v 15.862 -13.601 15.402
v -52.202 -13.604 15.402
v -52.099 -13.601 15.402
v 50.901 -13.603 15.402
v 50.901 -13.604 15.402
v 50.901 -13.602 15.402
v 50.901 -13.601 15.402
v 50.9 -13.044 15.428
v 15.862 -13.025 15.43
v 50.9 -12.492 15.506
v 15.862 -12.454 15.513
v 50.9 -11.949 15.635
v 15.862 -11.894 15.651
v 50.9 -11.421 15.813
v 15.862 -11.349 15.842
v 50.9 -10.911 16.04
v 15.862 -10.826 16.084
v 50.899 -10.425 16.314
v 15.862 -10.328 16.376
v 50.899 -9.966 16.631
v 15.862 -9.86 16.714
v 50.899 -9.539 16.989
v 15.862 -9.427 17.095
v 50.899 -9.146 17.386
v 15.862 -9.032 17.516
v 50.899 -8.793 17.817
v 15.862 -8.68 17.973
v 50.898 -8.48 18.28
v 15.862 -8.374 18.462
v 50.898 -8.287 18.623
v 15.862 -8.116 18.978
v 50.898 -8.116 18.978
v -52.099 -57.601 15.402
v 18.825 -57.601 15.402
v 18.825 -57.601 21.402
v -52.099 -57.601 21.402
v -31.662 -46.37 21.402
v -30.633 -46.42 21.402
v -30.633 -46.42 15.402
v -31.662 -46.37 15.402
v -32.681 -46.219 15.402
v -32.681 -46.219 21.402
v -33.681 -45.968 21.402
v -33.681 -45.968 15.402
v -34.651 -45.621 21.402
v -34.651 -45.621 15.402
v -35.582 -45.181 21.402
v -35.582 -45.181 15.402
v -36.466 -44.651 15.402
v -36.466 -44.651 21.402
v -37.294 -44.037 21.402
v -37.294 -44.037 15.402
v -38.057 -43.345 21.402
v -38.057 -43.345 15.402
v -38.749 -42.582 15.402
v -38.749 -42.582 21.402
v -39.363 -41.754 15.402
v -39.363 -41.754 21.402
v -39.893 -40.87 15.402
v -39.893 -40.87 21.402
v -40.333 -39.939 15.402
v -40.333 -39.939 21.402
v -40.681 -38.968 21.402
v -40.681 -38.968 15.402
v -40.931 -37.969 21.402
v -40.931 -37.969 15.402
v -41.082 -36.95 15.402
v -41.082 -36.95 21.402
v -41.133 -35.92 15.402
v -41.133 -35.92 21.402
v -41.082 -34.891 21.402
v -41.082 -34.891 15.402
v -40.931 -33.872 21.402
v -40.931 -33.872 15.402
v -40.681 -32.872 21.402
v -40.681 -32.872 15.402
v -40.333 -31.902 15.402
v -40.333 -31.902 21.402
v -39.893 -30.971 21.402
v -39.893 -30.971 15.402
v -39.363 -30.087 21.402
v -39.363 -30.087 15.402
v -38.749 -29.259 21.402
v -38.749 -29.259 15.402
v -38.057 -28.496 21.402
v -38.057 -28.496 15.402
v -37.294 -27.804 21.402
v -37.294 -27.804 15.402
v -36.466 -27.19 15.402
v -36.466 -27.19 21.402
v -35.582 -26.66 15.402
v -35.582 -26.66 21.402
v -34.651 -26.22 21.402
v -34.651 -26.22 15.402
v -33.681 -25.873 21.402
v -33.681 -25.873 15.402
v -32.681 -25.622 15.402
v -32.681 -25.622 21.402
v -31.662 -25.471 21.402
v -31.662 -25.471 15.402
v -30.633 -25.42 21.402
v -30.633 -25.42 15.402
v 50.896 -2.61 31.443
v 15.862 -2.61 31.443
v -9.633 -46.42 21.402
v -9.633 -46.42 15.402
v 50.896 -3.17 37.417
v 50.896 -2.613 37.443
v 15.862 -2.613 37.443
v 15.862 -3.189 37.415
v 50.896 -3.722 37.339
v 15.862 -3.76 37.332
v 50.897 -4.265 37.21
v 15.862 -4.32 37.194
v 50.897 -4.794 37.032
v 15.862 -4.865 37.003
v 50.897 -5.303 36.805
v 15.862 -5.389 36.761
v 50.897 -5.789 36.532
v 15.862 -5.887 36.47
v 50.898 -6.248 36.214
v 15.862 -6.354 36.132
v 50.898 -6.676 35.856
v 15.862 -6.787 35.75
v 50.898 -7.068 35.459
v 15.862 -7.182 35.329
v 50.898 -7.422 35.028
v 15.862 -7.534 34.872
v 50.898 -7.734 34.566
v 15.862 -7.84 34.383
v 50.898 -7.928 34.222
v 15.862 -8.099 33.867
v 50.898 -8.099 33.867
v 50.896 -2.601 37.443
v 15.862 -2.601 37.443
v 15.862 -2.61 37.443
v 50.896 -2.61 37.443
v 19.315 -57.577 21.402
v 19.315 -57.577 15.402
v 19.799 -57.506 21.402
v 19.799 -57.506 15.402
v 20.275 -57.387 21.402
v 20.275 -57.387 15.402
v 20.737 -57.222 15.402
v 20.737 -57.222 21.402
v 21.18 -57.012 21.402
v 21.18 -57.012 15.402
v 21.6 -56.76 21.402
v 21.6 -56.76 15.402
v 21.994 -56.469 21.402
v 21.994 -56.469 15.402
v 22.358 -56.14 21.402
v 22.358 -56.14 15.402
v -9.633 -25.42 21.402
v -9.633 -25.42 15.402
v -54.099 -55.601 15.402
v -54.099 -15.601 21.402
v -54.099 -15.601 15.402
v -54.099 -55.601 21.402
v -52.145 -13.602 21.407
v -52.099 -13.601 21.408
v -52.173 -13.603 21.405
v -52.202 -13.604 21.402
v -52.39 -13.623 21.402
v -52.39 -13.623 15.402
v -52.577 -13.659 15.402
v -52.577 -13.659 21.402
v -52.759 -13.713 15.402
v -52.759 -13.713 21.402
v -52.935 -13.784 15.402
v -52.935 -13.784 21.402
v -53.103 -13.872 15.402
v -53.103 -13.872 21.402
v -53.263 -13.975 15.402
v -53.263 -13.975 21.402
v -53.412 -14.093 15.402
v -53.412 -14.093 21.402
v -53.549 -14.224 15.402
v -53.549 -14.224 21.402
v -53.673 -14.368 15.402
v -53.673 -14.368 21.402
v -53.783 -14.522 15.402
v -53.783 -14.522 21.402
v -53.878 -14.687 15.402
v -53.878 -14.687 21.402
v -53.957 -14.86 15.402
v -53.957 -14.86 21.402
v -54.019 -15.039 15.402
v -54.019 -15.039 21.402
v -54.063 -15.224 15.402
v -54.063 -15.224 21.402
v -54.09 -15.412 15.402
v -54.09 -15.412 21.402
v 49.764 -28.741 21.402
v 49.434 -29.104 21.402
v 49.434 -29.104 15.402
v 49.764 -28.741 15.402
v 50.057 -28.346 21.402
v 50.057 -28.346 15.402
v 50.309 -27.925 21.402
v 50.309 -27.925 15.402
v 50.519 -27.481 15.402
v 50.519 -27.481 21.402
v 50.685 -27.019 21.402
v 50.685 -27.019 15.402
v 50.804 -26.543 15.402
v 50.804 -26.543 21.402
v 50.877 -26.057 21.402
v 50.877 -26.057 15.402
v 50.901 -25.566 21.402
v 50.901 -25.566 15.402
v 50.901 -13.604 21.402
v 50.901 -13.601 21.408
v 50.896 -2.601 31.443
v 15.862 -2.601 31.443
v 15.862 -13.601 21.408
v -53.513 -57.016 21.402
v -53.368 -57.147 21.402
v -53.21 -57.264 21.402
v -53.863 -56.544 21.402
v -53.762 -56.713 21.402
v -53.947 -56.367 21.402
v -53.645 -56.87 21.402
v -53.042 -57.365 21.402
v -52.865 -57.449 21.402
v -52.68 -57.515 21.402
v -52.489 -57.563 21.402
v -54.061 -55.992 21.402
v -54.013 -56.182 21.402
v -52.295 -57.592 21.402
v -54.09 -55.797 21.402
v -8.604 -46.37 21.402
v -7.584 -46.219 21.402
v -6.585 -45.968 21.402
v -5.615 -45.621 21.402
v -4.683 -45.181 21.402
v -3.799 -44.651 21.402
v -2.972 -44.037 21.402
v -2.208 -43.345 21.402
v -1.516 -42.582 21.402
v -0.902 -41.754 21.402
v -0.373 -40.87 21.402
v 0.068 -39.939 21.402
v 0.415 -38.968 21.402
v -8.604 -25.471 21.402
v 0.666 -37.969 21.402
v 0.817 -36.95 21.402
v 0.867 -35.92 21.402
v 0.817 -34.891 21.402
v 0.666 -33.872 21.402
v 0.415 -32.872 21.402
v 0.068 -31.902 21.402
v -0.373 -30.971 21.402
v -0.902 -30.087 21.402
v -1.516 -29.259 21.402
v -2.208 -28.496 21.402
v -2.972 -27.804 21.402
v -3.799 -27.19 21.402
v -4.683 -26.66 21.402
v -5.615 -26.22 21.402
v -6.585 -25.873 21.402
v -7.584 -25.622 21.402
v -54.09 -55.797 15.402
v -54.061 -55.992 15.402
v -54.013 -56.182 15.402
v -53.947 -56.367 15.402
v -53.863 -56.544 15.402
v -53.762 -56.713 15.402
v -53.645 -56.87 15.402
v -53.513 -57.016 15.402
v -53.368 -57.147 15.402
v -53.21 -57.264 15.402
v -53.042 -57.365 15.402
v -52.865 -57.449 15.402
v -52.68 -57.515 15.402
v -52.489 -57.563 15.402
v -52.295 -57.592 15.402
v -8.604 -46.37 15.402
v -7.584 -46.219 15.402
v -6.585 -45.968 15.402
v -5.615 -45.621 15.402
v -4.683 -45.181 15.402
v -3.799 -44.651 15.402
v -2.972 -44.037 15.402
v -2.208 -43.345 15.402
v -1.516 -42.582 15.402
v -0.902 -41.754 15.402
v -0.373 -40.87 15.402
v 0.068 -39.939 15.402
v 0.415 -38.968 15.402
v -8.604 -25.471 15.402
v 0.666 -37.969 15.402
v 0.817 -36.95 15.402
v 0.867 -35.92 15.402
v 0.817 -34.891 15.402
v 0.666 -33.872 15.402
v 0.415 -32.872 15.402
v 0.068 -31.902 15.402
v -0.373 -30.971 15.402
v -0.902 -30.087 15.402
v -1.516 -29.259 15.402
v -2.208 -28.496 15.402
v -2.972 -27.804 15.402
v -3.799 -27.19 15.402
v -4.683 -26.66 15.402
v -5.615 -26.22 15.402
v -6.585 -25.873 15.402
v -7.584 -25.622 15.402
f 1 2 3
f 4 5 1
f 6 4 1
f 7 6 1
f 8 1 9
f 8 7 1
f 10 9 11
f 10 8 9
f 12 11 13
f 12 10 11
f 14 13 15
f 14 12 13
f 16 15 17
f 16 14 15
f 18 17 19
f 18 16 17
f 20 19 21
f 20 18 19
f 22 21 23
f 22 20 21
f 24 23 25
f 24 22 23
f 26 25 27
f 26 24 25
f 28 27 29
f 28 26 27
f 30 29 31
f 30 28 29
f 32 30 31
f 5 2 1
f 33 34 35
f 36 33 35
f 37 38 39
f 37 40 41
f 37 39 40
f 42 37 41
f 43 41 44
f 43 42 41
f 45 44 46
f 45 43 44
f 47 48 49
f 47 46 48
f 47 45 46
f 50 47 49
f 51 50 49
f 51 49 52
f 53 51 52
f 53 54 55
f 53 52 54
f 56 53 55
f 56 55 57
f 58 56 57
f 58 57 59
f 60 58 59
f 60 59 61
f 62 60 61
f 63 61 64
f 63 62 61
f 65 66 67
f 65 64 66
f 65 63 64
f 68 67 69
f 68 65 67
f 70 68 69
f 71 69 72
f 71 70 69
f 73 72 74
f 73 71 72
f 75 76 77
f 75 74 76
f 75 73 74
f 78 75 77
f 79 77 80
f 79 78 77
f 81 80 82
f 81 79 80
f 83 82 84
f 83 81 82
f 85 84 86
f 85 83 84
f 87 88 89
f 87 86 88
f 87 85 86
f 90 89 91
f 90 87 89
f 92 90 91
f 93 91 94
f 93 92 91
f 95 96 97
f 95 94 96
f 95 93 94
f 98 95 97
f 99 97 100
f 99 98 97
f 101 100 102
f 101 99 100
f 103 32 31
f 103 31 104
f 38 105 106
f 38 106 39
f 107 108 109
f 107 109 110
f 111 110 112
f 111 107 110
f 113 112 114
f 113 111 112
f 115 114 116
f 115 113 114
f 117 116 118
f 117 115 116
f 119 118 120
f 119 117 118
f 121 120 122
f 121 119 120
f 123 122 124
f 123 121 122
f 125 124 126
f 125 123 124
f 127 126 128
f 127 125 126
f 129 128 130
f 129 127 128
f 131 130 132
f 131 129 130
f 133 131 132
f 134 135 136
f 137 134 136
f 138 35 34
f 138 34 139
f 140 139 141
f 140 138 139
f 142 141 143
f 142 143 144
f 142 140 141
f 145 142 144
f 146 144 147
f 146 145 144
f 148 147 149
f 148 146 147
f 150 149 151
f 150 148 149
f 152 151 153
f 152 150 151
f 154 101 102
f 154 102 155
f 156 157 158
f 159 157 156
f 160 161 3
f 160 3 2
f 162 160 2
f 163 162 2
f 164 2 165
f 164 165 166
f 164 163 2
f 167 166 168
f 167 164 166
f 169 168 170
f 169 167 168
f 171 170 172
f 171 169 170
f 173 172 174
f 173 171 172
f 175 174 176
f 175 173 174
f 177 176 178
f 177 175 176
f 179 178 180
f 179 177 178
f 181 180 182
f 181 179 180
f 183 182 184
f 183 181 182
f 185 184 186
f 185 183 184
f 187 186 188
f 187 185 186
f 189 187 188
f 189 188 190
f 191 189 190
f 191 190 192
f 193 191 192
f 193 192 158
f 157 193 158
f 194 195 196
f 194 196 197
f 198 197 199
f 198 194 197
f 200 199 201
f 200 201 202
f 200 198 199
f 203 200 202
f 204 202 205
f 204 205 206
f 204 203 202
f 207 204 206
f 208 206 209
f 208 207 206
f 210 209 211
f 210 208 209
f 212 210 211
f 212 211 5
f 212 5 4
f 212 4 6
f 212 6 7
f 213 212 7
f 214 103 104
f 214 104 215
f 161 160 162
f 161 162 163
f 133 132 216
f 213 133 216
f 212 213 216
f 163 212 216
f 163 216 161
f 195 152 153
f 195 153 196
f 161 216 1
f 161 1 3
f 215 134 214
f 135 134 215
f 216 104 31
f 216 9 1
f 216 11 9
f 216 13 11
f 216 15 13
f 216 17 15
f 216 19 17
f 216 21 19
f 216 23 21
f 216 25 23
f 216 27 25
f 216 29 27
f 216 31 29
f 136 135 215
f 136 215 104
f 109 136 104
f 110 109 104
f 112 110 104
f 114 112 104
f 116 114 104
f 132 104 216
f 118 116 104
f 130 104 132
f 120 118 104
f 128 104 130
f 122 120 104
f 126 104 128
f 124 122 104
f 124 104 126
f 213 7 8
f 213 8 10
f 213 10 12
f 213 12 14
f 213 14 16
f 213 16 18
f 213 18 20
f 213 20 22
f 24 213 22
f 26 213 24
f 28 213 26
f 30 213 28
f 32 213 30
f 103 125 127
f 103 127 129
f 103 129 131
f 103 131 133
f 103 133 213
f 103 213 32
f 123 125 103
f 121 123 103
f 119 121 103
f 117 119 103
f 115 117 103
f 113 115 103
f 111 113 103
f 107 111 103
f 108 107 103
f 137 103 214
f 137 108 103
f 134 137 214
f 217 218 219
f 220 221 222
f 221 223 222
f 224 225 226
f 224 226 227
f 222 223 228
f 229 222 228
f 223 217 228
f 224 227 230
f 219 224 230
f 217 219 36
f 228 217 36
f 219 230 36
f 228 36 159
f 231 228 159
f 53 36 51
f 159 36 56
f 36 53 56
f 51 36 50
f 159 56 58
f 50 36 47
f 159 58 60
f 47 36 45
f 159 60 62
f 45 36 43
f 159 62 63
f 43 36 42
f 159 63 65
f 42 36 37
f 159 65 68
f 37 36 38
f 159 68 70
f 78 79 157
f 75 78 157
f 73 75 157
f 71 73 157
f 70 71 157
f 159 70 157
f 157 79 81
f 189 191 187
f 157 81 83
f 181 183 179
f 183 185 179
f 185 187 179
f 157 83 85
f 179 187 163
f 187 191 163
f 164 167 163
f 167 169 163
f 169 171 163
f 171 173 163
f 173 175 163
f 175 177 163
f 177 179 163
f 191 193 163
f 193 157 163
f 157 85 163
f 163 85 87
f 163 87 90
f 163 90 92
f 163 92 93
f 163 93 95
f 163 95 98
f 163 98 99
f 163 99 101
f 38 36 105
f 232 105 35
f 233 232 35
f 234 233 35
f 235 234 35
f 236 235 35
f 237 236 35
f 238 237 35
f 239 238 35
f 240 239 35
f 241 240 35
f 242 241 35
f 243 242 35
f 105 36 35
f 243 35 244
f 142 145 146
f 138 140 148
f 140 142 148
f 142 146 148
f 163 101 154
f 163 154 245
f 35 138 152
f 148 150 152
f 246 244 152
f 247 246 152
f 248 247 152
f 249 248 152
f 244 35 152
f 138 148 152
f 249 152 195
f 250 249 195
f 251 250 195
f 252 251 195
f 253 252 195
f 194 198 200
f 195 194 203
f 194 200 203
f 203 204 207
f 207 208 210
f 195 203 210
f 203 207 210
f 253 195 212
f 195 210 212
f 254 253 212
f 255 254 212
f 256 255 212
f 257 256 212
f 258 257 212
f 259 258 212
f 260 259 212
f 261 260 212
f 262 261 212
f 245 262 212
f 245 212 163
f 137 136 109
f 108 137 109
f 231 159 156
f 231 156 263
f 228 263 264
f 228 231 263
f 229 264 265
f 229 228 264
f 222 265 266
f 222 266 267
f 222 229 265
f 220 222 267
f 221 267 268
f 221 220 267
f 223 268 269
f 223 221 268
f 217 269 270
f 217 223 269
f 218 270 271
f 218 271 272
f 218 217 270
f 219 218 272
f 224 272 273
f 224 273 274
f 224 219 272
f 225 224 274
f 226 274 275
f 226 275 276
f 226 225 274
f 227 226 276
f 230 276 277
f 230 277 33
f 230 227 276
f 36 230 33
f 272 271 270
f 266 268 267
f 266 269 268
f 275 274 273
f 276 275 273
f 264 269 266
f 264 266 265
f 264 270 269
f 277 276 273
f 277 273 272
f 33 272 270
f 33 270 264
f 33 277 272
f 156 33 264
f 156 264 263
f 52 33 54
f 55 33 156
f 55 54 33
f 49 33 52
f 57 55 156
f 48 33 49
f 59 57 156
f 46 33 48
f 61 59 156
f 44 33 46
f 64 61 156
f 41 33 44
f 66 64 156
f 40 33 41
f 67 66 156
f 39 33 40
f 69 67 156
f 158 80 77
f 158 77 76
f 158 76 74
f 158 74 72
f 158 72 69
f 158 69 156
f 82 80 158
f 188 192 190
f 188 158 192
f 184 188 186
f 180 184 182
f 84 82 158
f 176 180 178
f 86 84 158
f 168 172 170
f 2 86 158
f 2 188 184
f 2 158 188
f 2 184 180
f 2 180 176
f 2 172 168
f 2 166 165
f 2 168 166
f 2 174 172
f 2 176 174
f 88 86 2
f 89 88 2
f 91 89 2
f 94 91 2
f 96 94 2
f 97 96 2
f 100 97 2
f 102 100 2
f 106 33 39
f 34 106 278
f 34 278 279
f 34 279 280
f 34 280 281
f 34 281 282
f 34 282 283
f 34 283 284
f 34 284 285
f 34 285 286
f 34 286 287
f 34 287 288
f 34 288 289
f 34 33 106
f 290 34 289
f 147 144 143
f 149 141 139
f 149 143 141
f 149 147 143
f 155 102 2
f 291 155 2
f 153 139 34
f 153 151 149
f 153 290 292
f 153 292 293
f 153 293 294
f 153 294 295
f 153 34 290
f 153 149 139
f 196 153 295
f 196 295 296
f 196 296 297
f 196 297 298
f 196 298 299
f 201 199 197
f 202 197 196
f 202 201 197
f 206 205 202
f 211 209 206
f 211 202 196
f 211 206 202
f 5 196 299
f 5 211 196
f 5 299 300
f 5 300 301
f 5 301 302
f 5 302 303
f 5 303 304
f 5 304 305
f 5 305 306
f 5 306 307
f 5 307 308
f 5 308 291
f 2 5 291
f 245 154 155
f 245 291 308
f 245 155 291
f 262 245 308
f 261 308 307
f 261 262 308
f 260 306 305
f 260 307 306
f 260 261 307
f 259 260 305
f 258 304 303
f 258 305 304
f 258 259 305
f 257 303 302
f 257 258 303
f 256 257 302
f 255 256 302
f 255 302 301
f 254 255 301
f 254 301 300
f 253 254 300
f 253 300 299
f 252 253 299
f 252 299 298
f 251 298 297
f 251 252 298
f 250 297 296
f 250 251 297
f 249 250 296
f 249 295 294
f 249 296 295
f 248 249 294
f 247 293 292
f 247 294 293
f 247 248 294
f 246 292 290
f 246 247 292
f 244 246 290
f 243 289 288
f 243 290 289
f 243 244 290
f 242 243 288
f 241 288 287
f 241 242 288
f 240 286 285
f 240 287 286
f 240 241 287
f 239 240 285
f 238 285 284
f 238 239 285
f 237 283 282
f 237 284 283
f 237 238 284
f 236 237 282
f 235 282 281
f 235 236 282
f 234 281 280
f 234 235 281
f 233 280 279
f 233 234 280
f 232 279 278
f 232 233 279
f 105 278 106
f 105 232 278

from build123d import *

# Parameters (mm, degrees)
F1_DEPTH = 50
F2_W     = 43.9973853057
F2_H     = 6
F3_DEPTH = 125


# Not quite as in the source:
# - ends of sketch curves that miss each other by under 0.0002 mm in the source are joined
# - a feature names something its author has since deleted; it is built from what else it names


with BuildPart() as f1:
    # F0 (on Top) → F1 (new body, symmetric)
    with BuildSketch(Plane.XY):
        Polygon((15.8618143265, -2.6014313847), (15.8618143265, -13.6014313847), (50.9007196128, -13.6014313847), (50.8959237908, -2.6014324301), align=None)
        with BuildLine():
            Line((15.8618143265, -13.6014313847), (-52.0992803872, -13.6014313847))
            ThreePointArc((-52.0992803872, -13.6014313847), (-53.5134939495, -14.1872178223), (-54.0992803872, -15.6014313847))
            Line((-54.0992803872, -15.6014313847), (-54.0992803872, -55.6014313847))
            ThreePointArc((-54.0992803872, -55.6014313847), (-53.5134939495, -57.0156449471), (-52.0992803872, -57.6014313847))
            Line((-52.0992803872, -57.6014313847), (18.8248942664, -57.6014313847))
            ThreePointArc((18.8248942664, -57.6014313847), (20.7365745268, -57.2215481129), (22.3577686464, -56.1396228175))
            Line((22.3577686464, -56.1396228175), (49.4335939928, -29.1044859403))
            ThreePointArc((49.4335939928, -29.1044859403), (50.5193975568, -27.4814483002), (50.9007196128, -25.5662945075))
            Line((50.9007196128, -25.5662945075), (50.9007196128, -13.6014313847))
            Line((50.9007196128, -13.6014313847), (15.8618143265, -13.6014313847))
        make_face()
        with BuildLine():
            ThreePointArc((-30.6326959729, -46.4203889966), (-41.1326959729, -35.9203889966), (-30.6326959729, -25.4203889966))
            Line((-30.6326959729, -25.4203889966), (-9.6326959729, -25.4203889966))
            ThreePointArc((-9.6326959729, -25.4203889966), (0.8673040271, -35.9203889966), (-9.6326959729, -46.4203889966))
            Line((-9.6326959729, -46.4203889966), (-30.6326959729, -46.4203889966))
        make_face(mode=Mode.SUBTRACT)
    extrude(amount=F1_DEPTH, both=True)


with BuildPart() as f3:
    # F2 (on Right) → F3 (new body, symmetric)
    with BuildSketch(Plane.YZ):
        Polygon((-2.610102063, 37.4432504177), (-2.610102063, 31.4432504177), (54.789897937, 31.4432504177), (54.7872818802, 37.4557568013), align=None)
        with BuildLine():
            Line((-8.1155181983, 18.9779470539), (-2.610102063, 31.4432504177))
            Line((-2.610102063, 31.4432504177), (-2.6127167571, 37.443249848))
            ThreePointArc((-2.6127167571, 37.443249848), (-5.8865329423, 36.4696806314), (-8.0986299437, 33.8673093492))
            Line((-8.0986299437, 33.8673093492), (-13.6040460789, 21.4020059854))
            Line((-13.6040460789, 21.4020059854), (-13.6040460789, 15.4020059854))
            ThreePointArc((-13.6040460789, 15.4020059854), (-10.3287104922, 16.3748619856), (-8.1155181983, 18.9779470539))
        make_face()
        Polygon((-2.6127167571, 37.443249848), (-2.610102063, 31.4432504177), (-2.610102063, 37.4432504177), align=None)
        with Locations((-35.6027387318, 18.4020059854)):
            Rectangle(F2_W, F2_H)
    extrude(amount=F3_DEPTH, both=True)

    # F4: intersect F1
    add(f1.part, mode=Mode.INTERSECT)


solid = f3.part
